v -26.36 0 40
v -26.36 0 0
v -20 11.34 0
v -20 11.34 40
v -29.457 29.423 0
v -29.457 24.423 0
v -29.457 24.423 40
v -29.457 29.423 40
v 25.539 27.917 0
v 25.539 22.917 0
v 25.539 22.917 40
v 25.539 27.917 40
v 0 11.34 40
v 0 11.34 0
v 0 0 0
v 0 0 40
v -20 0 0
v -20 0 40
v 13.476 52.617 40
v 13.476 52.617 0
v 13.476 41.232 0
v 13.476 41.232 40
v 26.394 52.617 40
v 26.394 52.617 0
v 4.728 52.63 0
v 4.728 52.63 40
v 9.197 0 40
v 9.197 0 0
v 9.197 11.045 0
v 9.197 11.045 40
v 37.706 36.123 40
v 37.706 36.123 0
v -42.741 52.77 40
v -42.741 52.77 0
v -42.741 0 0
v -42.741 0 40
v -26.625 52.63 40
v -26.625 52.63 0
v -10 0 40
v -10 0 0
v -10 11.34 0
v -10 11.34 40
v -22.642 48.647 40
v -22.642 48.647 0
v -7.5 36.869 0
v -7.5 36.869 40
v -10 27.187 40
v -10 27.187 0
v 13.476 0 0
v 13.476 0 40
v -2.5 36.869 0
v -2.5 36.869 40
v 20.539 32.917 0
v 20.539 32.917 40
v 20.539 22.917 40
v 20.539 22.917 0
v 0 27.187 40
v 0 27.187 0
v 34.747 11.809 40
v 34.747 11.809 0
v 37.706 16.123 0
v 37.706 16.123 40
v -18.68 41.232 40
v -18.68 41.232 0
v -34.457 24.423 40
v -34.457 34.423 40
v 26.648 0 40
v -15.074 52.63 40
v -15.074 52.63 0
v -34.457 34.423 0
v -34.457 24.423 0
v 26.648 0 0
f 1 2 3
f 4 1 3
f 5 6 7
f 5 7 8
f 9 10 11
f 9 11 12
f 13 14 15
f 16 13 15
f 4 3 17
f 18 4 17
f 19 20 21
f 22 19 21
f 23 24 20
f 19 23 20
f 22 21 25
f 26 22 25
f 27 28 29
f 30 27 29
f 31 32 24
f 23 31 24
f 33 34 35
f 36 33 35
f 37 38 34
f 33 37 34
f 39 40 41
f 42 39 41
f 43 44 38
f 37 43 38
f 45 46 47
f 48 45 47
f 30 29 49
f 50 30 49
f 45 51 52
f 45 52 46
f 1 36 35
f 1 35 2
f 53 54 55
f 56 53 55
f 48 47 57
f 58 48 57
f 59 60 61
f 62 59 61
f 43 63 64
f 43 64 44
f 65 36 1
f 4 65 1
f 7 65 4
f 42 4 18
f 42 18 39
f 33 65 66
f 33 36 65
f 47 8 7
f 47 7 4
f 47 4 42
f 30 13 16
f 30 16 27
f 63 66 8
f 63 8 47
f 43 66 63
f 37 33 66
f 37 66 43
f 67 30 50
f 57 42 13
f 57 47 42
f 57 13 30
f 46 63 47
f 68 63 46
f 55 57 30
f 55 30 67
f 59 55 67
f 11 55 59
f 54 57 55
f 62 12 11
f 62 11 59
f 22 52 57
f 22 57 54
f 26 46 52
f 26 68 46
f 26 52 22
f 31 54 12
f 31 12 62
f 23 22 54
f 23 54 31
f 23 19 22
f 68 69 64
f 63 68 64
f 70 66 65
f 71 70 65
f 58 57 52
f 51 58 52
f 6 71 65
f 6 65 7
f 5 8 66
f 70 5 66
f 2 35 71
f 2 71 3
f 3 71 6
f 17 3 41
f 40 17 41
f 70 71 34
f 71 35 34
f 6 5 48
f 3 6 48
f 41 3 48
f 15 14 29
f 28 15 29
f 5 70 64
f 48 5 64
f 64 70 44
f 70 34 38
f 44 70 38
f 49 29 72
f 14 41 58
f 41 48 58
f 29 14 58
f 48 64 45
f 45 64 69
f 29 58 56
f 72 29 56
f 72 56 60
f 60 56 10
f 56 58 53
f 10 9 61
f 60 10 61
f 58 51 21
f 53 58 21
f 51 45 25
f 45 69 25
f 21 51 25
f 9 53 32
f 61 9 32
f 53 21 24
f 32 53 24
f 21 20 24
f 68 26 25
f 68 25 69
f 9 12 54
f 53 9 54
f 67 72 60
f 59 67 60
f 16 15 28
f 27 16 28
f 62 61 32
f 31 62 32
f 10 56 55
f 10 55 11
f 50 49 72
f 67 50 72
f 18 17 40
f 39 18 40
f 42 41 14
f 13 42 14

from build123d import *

# Parameters (mm, degrees)
F2_DEPTH = 40
F6_DEPTH = 40.001
F7_DEPTH = 40.001


with BuildPart() as f2:
    # F1 (on face) → F2 (new body)
    with BuildSketch(Plane.XY):
        Polygon((-30.25273, 38.586084), (-30.25273, 0), (-26.359774, 0), (-20, 11.340041), (-20, 0), (-10, 0), (-10, 11.340041), (0, 11.340041), (0, 0), (9.197158, 0), (9.197158, 11.045149), (13.475588, 0), (26.648319, 0), (34.74727, 11.808881), (34.74727, 38.586084), align=None)
        Polygon((-26.625307, 52.630479), (-42.740828, 52.770232), (-42.740828, 0), (-30.25273, 0), (-30.25273, 38.586084), (34.74727, 38.586084), (34.74727, 11.808881), (37.706377, 16.123482), (37.706377, 36.123482), (26.394449, 52.617125), (13.475588, 52.617125), (13.475588, 41.231845), (4.72787, 52.630479), (-15.074225, 52.630479), (-18.680247, 41.231845), (-22.642306, 48.647475), align=None)
    extrude(amount=F2_DEPTH)

    # F5 (on face) → F6 (cut, through all)
    with BuildSketch(Plane.XY.offset(40)):
        Polygon((-34.457395, 34.423446), (-34.457395, 24.423446), (-29.457395, 24.423446), (-29.457395, 29.423446), align=None)
        Polygon((25.539488, 27.917431), (20.539488, 32.917431), (20.539488, 22.917431), (25.539488, 22.917431), align=None)
    extrude(amount=-F6_DEPTH, mode=Mode.SUBTRACT)

    # F4 (on face) → F7 (cut, through all)
    with BuildSketch(Plane.XY.offset(40)):
        Polygon((-7.5, 36.869197), (-10, 27.186738), (0, 27.186738), (-2.5, 36.869197), align=None)
    extrude(amount=-F7_DEPTH, mode=Mode.SUBTRACT)


solid = f2.part
